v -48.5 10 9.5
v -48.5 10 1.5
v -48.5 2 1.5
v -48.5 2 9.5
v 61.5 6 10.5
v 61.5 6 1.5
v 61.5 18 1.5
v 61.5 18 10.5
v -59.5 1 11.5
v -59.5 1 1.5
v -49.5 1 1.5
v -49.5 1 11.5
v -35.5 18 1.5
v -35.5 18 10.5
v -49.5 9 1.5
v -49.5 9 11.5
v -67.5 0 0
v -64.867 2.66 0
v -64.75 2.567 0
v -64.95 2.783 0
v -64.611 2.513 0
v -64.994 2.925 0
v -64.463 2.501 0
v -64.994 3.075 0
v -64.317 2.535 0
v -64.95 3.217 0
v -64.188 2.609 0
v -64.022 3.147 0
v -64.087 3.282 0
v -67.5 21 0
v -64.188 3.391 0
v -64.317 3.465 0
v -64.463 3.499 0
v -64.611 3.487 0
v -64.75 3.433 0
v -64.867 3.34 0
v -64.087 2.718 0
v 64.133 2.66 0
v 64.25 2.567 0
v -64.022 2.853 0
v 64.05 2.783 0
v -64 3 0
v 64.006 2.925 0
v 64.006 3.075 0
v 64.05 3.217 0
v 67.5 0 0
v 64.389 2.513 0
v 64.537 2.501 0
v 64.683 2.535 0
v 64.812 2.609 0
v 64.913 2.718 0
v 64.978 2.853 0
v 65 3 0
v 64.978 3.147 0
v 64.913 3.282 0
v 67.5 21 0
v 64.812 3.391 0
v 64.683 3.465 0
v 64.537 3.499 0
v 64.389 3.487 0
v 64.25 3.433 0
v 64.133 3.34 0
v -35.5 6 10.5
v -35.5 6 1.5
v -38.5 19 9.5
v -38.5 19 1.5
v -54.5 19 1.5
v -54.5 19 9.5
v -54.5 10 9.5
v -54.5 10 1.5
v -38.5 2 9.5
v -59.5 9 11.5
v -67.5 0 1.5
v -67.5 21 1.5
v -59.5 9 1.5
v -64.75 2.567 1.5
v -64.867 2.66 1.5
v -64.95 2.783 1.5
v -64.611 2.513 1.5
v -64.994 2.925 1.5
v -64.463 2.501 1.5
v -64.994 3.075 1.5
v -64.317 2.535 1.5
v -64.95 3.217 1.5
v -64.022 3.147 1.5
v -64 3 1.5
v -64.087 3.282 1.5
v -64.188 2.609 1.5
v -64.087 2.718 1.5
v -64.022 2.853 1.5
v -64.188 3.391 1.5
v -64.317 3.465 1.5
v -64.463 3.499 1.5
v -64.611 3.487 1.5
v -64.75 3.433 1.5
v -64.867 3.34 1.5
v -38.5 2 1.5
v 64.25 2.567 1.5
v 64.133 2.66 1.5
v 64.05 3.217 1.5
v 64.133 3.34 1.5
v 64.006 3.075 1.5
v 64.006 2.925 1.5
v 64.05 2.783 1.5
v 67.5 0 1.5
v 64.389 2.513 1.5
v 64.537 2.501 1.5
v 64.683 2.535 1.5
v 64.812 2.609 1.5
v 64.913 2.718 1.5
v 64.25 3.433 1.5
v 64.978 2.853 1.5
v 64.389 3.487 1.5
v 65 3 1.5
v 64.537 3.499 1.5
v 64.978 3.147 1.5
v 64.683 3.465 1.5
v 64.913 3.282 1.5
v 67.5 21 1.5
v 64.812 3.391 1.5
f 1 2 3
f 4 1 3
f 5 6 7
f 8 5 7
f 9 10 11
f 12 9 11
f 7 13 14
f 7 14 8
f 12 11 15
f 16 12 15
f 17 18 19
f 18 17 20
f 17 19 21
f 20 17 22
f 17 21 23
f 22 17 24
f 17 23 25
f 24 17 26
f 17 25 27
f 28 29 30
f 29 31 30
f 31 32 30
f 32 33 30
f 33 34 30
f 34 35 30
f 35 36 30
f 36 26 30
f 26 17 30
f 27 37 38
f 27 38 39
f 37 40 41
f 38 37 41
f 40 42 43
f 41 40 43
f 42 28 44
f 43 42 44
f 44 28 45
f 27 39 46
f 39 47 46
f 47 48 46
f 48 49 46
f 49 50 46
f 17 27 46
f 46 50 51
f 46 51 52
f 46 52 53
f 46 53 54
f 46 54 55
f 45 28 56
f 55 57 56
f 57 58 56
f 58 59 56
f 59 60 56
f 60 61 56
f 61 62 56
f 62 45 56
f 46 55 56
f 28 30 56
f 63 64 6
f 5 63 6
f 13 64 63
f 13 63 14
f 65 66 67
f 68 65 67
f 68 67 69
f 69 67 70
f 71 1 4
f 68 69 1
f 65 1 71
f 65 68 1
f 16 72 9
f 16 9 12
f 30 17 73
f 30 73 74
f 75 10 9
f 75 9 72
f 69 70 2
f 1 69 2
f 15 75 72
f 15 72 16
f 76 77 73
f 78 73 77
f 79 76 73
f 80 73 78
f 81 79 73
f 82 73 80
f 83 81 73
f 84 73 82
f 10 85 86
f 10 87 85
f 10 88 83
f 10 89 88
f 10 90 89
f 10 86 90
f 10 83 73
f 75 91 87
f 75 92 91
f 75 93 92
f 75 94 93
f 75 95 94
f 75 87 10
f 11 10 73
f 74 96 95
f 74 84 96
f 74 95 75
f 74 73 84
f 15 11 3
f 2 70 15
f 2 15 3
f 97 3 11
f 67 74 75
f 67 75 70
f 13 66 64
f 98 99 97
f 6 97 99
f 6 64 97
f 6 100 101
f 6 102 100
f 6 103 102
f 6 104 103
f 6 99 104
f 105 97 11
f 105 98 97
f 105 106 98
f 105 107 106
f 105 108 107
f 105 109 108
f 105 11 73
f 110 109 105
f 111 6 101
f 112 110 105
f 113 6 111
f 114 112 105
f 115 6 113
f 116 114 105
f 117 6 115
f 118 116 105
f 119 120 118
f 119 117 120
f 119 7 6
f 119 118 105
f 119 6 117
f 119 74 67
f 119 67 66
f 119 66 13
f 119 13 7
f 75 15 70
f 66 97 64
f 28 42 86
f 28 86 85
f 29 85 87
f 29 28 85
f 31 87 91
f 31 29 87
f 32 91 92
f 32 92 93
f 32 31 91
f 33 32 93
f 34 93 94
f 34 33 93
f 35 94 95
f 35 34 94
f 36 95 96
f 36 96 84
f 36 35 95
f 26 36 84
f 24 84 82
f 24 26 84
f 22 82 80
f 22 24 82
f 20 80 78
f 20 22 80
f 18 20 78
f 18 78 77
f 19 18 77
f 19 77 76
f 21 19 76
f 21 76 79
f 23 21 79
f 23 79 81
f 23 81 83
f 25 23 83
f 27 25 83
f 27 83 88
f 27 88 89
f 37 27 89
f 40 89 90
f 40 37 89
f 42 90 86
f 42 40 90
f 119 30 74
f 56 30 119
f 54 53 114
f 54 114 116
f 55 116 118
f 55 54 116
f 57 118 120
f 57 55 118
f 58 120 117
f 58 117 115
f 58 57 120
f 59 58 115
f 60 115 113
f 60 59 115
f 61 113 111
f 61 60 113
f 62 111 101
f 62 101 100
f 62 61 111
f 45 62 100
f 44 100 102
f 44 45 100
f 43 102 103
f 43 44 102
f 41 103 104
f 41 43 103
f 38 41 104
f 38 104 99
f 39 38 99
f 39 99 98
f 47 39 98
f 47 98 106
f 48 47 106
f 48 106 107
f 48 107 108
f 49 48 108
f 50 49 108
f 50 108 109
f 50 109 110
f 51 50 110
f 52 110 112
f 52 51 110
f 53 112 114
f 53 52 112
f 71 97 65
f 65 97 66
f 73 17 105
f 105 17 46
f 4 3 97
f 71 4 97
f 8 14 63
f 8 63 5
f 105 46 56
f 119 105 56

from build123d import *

# Parameters (mm, degrees)
SKETCH_W     = 135
SKETCH_H     = 21
SKETCH_R     = 0.5
PAD_DEPTH    = 1.5
SKETCH001_W  = 97
SKETCH001_H  = 12
PAD001_DEPTH = 9
SKETCH002_W  = 10
SKETCH002_H  = 8
PAD002_DEPTH = 10
PAD003_DEPTH = 8


with BuildPart() as part:
    # Sketch → Pad (new body)
    with BuildSketch(Plane.XY):
        with Locations((0, 10.5)):
            Rectangle(SKETCH_W, SKETCH_H)
        with Locations((-64.5, 3)):
            Circle(SKETCH_R, mode=Mode.SUBTRACT)
        with Locations((64.5, 3)):
            Circle(SKETCH_R, mode=Mode.SUBTRACT)
    extrude(amount=PAD_DEPTH)

    # Sketch001 (on Face8 of Pad) → Pad001 (join)
    with BuildSketch(Plane.XY.offset(1.5)):
        with Locations((13, 12)):
            Rectangle(SKETCH001_W, SKETCH001_H)
    extrude(amount=PAD001_DEPTH)

    # Sketch002 (on Face5 of Pad001) → Pad002 (join)
    with BuildSketch(Plane.XY.offset(1.5)):
        with Locations((-54.5, 5)):
            Rectangle(SKETCH002_W, SKETCH002_H)
    extrude(amount=PAD002_DEPTH)

    # Sketch003 (on Face5 of Pad002) → Pad003 (join)
    with BuildSketch(Plane.XY.offset(1.5)):
        Polygon((-54.5, 10), (-48.5, 10), (-48.5, 2), (-38.5, 2), (-38.5, 19), (-54.5, 19), align=None)
    extrude(amount=PAD003_DEPTH)


solid = part.part
